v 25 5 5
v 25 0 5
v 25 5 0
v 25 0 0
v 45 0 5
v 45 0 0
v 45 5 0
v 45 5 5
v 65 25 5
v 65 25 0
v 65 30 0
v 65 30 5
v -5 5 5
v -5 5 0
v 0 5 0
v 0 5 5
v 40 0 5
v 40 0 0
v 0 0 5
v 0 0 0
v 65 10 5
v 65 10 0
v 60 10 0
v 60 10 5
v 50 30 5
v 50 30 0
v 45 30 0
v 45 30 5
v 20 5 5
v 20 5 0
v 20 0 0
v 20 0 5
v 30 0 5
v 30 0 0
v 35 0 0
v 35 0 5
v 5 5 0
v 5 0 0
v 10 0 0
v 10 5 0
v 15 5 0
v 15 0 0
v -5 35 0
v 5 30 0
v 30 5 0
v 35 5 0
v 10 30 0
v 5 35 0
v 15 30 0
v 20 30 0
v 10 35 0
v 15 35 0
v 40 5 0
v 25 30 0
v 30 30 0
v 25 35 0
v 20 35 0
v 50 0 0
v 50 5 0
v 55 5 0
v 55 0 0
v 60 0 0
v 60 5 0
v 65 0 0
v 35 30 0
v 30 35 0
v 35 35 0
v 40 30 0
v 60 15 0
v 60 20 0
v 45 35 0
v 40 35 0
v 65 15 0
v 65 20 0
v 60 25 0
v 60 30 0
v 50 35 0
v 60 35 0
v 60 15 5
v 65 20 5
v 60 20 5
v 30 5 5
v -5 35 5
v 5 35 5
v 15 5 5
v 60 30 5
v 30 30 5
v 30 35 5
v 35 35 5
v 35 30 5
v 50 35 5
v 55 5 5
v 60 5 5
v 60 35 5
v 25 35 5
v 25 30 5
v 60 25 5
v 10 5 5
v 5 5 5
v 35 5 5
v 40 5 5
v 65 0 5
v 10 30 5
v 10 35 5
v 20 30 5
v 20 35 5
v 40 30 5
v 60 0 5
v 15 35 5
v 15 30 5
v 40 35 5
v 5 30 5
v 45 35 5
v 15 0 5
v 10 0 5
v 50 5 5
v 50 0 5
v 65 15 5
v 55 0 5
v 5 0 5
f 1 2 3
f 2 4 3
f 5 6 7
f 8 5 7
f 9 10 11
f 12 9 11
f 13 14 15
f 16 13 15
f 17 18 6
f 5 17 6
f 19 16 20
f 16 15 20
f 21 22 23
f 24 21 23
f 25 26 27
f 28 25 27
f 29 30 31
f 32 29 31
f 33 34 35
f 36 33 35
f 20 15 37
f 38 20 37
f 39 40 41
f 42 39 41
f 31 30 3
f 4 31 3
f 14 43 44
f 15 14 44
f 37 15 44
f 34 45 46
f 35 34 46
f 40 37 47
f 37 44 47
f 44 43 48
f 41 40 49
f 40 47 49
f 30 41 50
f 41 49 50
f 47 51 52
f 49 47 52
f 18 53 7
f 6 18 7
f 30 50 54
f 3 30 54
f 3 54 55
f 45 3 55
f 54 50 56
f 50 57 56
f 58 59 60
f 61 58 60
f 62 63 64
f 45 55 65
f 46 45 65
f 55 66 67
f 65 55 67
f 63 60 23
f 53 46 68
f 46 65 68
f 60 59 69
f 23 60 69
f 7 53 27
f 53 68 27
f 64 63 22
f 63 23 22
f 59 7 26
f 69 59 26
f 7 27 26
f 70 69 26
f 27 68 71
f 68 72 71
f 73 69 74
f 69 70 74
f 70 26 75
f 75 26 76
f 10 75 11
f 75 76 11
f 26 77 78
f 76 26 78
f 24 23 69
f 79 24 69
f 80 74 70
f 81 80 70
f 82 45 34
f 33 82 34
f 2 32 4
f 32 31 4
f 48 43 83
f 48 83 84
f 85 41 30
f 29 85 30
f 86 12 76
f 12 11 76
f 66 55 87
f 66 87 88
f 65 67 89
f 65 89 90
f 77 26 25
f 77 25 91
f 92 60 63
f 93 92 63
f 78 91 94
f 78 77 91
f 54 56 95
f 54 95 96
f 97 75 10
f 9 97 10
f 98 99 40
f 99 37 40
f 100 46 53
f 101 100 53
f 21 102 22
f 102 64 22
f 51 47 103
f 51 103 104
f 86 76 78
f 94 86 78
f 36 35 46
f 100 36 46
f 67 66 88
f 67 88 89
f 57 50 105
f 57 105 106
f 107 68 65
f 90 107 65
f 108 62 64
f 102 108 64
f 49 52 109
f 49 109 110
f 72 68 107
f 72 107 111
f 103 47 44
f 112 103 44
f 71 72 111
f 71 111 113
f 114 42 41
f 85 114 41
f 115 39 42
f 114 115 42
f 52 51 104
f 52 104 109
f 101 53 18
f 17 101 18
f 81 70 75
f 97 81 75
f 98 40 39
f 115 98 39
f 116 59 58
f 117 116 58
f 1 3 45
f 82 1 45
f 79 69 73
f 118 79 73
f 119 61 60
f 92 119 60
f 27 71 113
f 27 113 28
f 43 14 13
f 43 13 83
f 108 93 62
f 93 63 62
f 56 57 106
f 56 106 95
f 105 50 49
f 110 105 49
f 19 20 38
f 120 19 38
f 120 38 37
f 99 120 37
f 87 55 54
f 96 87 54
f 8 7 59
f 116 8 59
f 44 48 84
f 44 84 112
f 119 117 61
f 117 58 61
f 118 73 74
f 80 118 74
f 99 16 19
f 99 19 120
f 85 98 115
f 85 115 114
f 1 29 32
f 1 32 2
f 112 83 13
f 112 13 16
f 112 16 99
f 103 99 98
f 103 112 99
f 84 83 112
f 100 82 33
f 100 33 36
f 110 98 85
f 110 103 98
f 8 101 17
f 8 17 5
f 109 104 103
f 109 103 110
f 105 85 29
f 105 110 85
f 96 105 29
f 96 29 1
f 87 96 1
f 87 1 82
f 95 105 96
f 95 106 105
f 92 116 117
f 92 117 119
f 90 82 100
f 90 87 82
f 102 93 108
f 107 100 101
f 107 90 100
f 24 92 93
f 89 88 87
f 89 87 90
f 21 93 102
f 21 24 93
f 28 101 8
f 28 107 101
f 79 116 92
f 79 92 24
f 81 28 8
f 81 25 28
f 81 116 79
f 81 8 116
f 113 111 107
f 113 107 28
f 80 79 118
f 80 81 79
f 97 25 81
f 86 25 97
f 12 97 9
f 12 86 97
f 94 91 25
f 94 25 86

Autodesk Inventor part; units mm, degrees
ref_plane "YZ Plane" through (0, 0, 0) normal (1, 0, 0) x (0, 1, 0)
ref_plane "XZ Plane" through (0, 0, 0) normal (0, 1, 0) x (-1, 0, 0)
ref_plane "XY Plane" through (0, 0, 0) normal (0, 0, 1) x (1, 0, 0)
sketch "Sketch2" plane through (0, 0, 0) normal (0, 0, 1) x (1, 0, 0)
  line L0 (0, 0) -> (5, 0)
  line L1 (5, 0) -> (5, 5)
  line L2 (5, 5) -> (0, 5)
  line L3 (0, 5) -> (0, 0)
  line L4 (0, 5) -> (65, 5)
  line L5 (65, 5) -> (65, 30)
  line L6 (65, 30) -> (0, 30)
  line L7 (0, 30) -> (0, 5)
  line L8 (10, 0) -> (15, 0)
  line L9 (15, 0) -> (15, 5)
  line L10 (10, 5) -> (10, 0)
  line L11 (20, 0) -> (25, 0)
  line L12 (25, 0) -> (25, 5)
  line L13 (20, 5) -> (20, 0)
  line L14 (30, 0) -> (35, 0)
  line L15 (35, 0) -> (35, 5)
  line L16 (30, 5) -> (30, 0)
  line L17 (40, 0) -> (45, 0)
  line L18 (45, 0) -> (45, 5)
  line L19 (40, 5) -> (40, 0)
  line L20 (50, 0) -> (55, 0)
  line L21 (55, 0) -> (55, 5)
  line L22 (50, 5) -> (50, 0)
  line L23 (60, 0) -> (65, 0)
  line L24 (65, 0) -> (65, 5)
  line L25 (60, 5) -> (60, 0)
  line L26 (65, 25) -> (70, 25)
  line L27 (70, 25) -> (70, 20)
  line L28 (70, 20) -> (65, 20)
  line L29 (65, 20) -> (65, 25)
  line L30 (65, 15) -> (70, 15)
  line L31 (70, 15) -> (70, 10)
  line L32 (70, 10) -> (65, 10)
  line L33 (65, 10) -> (65, 15)
  line L34 (0, 35) -> (5, 35)
  line L35 (5, 35) -> (5, 30)
  line L36 (5, 30) -> (0, 30)
  line L37 (0, 30) -> (0, 35)
  line L38 (15, 35) -> (15, 30)
  line L39 (15, 30) -> (10, 30)
  line L40 (10, 35) -> (15, 35)
  line L41 (10, 30) -> (10, 35)
  line L42 (25, 35) -> (25, 30)
  line L43 (25, 30) -> (20, 30)
  line L44 (20, 35) -> (25, 35)
  line L45 (20, 30) -> (20, 35)
  line L46 (35, 35) -> (35, 30)
  line L47 (35, 30) -> (30, 30)
  line L48 (30, 35) -> (35, 35)
  line L49 (30, 30) -> (30, 35)
  line L50 (45, 35) -> (45, 30)
  line L51 (45, 30) -> (40, 30)
  line L52 (40, 35) -> (45, 35)
  line L53 (40, 30) -> (40, 35)
  line L54 (55, 35) -> (55, 30)
  line L55 (55, 30) -> (50, 30)
  line L56 (50, 35) -> (55, 35)
  line L57 (50, 30) -> (50, 35)
  line L58 (65, 35) -> (65, 30)
  line L59 (65, 30) -> (60, 30)
  line L60 (60, 35) -> (65, 35)
  line L61 (60, 30) -> (60, 35)
  line L62 (-5, 35) -> (0, 35)
  line L63 (0, 35) -> (0, 0)
  line L64 (0, 0) -> (-5, 0)
  line L65 (-5, 0) -> (-5, 35)
  line L66 (-5, 5) -> (0, 5)
  line L67 (0, 5) -> (0, 0)
  line L68 (0, 0) -> (-5, 0)
  line L69 (-5, 0) -> (-5, 5)
  line L70 (55, 35) -> (60, 35)
  line L71 (60, 35) -> (60, 30)
  line L72 (60, 30) -> (55, 30)
  line L73 (55, 30) -> (55, 35)
  line L74 (60, 25) -> (65, 25)
  line L75 (65, 25) -> (65, 20)
  line L76 (65, 20) -> (60, 20)
  line L77 (60, 20) -> (60, 25)
  line L78 (60, 15) -> (65, 15)
  line L79 (65, 15) -> (65, 10)
  line L80 (65, 10) -> (60, 10)
  line L81 (60, 10) -> (60, 15)
  line L82 (60, 30) -> (65, 30)
  line L83 (65, 30) -> (65, 5)
  line L84 (65, 5) -> (60, 5)
  line L85 (60, 5) -> (60, 30)
  dimension "d97" = 10
  dimension "d102" = 25
  dimension "d105" = 10
extrude "Extrusion3" add sketch "Sketch2" along normal blind 5 contours L3 L2 L1 L0 | L7 L6 L85 L77 L81 L4 L2 | L66 L65 L62 L37 L7 | L37 L34 L35 L6 | L4 L9 L8 L10 | L41 L40 L38 L6 | L4 L12 L11 L13 | L45 L44 L42 L6 | L4 L15 L14 L16 | L49 L48 L46 L6 | L4 L18 L17 L19 | L53 L52 L50 L6 | L4 L21 L20 L22 | L57 L56 L54 L6 | L85 L80 L5 L4 | L4 L24 L23 L25 | L54 L70 L61 L6 | L6 L5 L74 L85 | L85 L76 L5 L78
properties part number "backside"
